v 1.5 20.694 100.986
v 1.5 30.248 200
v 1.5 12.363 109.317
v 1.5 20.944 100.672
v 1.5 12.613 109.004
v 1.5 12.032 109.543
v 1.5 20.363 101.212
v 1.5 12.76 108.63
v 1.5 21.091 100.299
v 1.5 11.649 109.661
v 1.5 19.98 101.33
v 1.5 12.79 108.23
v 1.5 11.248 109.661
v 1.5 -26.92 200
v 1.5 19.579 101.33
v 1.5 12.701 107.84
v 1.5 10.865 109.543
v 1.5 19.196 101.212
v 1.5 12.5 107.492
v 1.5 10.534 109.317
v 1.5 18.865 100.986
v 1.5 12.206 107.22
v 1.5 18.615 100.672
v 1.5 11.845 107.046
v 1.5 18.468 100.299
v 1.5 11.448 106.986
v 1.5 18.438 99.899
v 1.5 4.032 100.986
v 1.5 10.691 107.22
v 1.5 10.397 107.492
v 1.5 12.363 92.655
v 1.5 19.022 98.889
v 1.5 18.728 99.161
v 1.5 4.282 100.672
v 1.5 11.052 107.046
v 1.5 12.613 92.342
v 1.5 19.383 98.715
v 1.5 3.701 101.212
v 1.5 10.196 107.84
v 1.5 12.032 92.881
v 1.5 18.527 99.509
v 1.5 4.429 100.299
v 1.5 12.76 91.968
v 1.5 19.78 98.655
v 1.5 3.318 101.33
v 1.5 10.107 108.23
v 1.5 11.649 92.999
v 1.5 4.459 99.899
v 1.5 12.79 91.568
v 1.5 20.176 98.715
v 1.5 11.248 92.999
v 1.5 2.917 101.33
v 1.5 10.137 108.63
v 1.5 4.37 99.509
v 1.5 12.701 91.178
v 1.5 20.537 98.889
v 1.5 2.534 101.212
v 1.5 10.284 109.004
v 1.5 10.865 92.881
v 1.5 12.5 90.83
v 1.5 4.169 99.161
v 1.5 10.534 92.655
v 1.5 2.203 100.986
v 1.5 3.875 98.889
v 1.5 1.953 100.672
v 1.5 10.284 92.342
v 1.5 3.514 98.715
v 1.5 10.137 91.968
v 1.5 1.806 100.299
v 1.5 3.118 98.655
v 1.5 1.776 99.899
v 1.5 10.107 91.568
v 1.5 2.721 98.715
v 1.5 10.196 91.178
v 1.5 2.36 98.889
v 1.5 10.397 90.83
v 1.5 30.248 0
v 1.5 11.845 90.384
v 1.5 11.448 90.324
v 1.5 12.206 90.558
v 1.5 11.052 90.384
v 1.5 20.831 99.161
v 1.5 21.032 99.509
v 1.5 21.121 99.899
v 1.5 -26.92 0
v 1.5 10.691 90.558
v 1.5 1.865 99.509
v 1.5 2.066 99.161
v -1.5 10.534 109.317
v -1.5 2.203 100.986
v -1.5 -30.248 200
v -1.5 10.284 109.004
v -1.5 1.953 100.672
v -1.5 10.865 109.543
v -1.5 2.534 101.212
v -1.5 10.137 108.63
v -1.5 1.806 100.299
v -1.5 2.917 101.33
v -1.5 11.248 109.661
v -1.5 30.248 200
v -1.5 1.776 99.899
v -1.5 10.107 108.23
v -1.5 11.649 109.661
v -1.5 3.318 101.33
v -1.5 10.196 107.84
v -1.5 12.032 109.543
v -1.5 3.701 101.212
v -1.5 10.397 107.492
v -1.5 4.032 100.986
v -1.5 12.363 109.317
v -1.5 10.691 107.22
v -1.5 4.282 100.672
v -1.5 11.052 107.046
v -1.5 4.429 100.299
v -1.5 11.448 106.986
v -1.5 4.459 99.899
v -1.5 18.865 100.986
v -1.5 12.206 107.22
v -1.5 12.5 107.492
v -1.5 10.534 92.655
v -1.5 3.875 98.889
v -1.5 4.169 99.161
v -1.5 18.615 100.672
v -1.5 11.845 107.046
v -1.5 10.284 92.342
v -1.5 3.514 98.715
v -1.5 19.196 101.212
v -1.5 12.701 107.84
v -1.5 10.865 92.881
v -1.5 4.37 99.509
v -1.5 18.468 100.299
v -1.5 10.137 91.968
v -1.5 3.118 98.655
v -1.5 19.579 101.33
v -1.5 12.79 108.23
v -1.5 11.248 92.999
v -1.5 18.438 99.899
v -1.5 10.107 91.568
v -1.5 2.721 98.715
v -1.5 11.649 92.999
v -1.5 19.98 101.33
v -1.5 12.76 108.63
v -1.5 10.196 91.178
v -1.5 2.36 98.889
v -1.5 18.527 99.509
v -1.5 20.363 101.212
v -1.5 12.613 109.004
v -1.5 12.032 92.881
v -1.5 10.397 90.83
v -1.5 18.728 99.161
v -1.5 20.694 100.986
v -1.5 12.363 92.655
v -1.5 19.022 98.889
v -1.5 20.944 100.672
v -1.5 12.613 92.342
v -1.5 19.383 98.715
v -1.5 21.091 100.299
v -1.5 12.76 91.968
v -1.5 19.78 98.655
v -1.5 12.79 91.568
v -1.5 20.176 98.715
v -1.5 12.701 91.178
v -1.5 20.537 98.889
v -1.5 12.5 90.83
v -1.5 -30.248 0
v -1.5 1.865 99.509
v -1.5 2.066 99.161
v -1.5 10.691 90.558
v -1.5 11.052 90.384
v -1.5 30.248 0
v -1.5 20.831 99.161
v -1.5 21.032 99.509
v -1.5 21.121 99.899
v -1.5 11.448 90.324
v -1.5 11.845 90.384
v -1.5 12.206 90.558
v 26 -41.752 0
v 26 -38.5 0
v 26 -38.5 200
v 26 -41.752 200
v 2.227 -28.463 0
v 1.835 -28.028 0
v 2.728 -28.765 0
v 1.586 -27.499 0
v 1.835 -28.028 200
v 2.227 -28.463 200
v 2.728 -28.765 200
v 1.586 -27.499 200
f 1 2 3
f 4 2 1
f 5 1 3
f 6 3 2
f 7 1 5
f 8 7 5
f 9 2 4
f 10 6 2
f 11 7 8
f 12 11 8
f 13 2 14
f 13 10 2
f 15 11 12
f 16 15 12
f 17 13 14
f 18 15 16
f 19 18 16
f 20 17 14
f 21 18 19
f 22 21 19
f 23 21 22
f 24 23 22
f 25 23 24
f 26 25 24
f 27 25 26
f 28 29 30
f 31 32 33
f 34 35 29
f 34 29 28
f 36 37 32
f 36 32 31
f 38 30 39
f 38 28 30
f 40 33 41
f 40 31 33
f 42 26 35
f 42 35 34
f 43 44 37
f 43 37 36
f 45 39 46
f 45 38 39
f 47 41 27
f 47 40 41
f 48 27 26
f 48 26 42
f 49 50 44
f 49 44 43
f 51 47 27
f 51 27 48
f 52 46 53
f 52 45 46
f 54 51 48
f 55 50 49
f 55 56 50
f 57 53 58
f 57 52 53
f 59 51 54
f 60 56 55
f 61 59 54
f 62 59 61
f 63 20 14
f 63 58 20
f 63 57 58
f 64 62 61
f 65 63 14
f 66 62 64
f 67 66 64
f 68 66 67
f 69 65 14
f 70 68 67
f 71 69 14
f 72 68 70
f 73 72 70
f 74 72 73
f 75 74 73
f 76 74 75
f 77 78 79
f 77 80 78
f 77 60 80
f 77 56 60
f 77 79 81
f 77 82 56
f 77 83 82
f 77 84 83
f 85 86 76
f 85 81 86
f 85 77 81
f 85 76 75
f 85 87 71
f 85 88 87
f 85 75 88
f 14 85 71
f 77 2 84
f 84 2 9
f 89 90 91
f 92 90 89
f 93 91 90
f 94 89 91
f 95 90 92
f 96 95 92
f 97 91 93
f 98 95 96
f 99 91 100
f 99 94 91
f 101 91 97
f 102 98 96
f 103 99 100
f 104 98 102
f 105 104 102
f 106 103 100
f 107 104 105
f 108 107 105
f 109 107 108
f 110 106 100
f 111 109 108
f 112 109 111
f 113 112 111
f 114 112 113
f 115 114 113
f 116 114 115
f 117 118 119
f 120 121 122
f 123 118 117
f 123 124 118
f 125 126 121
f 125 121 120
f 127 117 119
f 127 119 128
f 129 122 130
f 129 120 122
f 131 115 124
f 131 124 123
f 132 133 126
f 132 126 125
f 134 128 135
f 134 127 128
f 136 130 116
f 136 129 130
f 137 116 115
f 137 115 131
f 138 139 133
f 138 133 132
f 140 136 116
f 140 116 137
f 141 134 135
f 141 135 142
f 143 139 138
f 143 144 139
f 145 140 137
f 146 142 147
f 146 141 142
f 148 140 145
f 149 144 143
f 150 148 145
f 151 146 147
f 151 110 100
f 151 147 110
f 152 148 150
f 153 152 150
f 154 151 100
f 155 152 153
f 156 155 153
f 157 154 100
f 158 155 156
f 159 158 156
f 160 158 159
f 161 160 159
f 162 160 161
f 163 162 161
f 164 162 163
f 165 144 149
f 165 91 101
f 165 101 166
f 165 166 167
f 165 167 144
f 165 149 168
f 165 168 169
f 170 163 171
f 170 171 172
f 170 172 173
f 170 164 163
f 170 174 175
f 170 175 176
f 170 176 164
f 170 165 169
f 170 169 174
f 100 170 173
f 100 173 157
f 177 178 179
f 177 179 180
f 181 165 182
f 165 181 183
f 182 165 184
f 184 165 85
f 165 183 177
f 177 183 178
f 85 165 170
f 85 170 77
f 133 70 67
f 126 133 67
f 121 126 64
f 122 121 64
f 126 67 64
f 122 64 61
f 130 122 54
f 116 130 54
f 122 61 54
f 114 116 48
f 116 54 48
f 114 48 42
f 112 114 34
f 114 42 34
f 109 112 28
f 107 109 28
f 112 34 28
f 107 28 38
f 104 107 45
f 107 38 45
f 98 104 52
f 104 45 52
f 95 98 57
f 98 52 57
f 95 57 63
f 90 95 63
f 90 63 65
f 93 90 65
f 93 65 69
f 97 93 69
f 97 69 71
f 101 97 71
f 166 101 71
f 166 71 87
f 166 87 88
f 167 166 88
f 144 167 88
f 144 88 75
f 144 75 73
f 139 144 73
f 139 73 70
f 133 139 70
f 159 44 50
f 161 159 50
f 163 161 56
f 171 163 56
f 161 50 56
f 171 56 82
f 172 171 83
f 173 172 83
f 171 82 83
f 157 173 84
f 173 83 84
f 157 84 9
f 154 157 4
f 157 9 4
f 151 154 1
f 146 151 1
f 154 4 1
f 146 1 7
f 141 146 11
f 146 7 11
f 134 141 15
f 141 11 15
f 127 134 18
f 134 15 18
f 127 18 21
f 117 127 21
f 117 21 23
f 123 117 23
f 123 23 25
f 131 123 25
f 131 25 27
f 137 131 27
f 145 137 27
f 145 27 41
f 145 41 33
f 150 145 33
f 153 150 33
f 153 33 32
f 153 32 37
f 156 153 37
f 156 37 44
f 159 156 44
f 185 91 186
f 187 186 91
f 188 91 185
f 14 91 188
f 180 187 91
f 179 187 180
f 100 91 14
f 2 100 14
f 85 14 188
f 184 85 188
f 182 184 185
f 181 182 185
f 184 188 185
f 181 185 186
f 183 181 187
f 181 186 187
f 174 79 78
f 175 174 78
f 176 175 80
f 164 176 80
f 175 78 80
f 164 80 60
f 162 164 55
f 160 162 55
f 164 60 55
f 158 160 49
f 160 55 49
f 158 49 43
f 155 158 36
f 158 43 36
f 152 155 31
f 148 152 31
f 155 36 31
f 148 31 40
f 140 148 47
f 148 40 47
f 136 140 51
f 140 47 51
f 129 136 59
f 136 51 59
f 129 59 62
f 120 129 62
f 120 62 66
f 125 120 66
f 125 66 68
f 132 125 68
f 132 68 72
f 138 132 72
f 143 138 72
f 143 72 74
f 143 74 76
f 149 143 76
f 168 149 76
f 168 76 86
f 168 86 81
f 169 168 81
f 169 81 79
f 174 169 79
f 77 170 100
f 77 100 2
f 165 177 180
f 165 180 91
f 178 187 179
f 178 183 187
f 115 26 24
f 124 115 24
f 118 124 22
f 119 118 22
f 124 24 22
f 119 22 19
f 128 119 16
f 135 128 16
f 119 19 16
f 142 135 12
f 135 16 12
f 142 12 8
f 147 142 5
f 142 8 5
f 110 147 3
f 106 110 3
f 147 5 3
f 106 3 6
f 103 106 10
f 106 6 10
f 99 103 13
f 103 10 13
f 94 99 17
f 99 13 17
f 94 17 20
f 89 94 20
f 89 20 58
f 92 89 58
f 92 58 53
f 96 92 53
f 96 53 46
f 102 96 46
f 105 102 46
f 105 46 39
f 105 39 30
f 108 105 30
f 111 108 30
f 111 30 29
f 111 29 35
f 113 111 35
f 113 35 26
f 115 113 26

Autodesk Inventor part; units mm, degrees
ref_plane "YZ Plane" through (0, 0, 0) normal (1, 0, 0) x (0, 1, 0)
ref_plane "XZ Plane" through (0, 0, 0) normal (0, 1, 0) x (-1, 0, 0)
ref_plane "XY Plane" through (0, 0, 0) normal (0, 0, 1) x (1, 0, 0)
sketch "Sketch3" plane through (0, 0, 0) normal (0, 0, 1) x (1, 0, 0)
  line L0 (-1.5, 30.2485) -> (1.5, 30.2485)
  line L1 (1.5, 30.2485) -> (1.5, -30.2485)
  line L2 (1.5, -30.2485) -> (-1.5, -30.2485)
  line L3 (-1.5, -30.2485) -> (-1.5, 30.2485)
  line L4 (1.5, -28.2515) -> (26, -38.4996)
  line L5 (26, -38.4996) -> (26, -41.7515)
  line L6 (26, -41.7515) -> (-1.5, -30.2485)
  point P0 (0, 0)
  point P1 (0, 30.2485)
  point P2 (1.5, 0)
  dimension "d20" = 3
  dimension "d26" = 24.5
  dimension "d39" = 3
  dimension "d41" = 58.5
  dimension "d43" = 72
extrude "Extrusion3" add sketch "Sketch3" along normal blind 200
sketch "Sketch4" plane through (1.5, -28.2515, 0) normal (1, 0, 0) x (0, 0, -1)
  circle A0 centre (-100, 48.031) radius 1.345
  circle A1 centre (-100, 31.369) radius 1.345
  circle A2 centre (-91.669, 39.7) radius 1.345
  circle A3 centre (-108.331, 39.7) radius 1.345
  line L0 (0, 58.5) -> (0, 0) projected
  line L1 (0, 58.5) -> (-200, 58.5) projected
  line L2 (-200, 0) -> (-200, 58.5) projected
  line L3 (0, 0) -> (-200, 0) projected
  point P0 (-100, 58.5)
  dimension "d28" = 2.69
  dimension "d30" = 8.331
  dimension "d31" = 8.331
  dimension "d32" = 8.331
  dimension "d33" = 8.331
  dimension "d34" = 16.662
  dimension "d35" = 16.662
  dimension "d36" = 10.469
extrude "Extrusion4" cut sketch "Sketch4" against normal through all contours A0 | A1 | A2 | A3
fillet "Fillet1" radius 2 1 edges at (1.5, -28.2515, 100)
equation "\"d31\" = d30"
equation "\"d32\" = d30"
equation "\"d33\" = d30"
equation "\"d35\" = d34"
properties part number "FlatPlow"
